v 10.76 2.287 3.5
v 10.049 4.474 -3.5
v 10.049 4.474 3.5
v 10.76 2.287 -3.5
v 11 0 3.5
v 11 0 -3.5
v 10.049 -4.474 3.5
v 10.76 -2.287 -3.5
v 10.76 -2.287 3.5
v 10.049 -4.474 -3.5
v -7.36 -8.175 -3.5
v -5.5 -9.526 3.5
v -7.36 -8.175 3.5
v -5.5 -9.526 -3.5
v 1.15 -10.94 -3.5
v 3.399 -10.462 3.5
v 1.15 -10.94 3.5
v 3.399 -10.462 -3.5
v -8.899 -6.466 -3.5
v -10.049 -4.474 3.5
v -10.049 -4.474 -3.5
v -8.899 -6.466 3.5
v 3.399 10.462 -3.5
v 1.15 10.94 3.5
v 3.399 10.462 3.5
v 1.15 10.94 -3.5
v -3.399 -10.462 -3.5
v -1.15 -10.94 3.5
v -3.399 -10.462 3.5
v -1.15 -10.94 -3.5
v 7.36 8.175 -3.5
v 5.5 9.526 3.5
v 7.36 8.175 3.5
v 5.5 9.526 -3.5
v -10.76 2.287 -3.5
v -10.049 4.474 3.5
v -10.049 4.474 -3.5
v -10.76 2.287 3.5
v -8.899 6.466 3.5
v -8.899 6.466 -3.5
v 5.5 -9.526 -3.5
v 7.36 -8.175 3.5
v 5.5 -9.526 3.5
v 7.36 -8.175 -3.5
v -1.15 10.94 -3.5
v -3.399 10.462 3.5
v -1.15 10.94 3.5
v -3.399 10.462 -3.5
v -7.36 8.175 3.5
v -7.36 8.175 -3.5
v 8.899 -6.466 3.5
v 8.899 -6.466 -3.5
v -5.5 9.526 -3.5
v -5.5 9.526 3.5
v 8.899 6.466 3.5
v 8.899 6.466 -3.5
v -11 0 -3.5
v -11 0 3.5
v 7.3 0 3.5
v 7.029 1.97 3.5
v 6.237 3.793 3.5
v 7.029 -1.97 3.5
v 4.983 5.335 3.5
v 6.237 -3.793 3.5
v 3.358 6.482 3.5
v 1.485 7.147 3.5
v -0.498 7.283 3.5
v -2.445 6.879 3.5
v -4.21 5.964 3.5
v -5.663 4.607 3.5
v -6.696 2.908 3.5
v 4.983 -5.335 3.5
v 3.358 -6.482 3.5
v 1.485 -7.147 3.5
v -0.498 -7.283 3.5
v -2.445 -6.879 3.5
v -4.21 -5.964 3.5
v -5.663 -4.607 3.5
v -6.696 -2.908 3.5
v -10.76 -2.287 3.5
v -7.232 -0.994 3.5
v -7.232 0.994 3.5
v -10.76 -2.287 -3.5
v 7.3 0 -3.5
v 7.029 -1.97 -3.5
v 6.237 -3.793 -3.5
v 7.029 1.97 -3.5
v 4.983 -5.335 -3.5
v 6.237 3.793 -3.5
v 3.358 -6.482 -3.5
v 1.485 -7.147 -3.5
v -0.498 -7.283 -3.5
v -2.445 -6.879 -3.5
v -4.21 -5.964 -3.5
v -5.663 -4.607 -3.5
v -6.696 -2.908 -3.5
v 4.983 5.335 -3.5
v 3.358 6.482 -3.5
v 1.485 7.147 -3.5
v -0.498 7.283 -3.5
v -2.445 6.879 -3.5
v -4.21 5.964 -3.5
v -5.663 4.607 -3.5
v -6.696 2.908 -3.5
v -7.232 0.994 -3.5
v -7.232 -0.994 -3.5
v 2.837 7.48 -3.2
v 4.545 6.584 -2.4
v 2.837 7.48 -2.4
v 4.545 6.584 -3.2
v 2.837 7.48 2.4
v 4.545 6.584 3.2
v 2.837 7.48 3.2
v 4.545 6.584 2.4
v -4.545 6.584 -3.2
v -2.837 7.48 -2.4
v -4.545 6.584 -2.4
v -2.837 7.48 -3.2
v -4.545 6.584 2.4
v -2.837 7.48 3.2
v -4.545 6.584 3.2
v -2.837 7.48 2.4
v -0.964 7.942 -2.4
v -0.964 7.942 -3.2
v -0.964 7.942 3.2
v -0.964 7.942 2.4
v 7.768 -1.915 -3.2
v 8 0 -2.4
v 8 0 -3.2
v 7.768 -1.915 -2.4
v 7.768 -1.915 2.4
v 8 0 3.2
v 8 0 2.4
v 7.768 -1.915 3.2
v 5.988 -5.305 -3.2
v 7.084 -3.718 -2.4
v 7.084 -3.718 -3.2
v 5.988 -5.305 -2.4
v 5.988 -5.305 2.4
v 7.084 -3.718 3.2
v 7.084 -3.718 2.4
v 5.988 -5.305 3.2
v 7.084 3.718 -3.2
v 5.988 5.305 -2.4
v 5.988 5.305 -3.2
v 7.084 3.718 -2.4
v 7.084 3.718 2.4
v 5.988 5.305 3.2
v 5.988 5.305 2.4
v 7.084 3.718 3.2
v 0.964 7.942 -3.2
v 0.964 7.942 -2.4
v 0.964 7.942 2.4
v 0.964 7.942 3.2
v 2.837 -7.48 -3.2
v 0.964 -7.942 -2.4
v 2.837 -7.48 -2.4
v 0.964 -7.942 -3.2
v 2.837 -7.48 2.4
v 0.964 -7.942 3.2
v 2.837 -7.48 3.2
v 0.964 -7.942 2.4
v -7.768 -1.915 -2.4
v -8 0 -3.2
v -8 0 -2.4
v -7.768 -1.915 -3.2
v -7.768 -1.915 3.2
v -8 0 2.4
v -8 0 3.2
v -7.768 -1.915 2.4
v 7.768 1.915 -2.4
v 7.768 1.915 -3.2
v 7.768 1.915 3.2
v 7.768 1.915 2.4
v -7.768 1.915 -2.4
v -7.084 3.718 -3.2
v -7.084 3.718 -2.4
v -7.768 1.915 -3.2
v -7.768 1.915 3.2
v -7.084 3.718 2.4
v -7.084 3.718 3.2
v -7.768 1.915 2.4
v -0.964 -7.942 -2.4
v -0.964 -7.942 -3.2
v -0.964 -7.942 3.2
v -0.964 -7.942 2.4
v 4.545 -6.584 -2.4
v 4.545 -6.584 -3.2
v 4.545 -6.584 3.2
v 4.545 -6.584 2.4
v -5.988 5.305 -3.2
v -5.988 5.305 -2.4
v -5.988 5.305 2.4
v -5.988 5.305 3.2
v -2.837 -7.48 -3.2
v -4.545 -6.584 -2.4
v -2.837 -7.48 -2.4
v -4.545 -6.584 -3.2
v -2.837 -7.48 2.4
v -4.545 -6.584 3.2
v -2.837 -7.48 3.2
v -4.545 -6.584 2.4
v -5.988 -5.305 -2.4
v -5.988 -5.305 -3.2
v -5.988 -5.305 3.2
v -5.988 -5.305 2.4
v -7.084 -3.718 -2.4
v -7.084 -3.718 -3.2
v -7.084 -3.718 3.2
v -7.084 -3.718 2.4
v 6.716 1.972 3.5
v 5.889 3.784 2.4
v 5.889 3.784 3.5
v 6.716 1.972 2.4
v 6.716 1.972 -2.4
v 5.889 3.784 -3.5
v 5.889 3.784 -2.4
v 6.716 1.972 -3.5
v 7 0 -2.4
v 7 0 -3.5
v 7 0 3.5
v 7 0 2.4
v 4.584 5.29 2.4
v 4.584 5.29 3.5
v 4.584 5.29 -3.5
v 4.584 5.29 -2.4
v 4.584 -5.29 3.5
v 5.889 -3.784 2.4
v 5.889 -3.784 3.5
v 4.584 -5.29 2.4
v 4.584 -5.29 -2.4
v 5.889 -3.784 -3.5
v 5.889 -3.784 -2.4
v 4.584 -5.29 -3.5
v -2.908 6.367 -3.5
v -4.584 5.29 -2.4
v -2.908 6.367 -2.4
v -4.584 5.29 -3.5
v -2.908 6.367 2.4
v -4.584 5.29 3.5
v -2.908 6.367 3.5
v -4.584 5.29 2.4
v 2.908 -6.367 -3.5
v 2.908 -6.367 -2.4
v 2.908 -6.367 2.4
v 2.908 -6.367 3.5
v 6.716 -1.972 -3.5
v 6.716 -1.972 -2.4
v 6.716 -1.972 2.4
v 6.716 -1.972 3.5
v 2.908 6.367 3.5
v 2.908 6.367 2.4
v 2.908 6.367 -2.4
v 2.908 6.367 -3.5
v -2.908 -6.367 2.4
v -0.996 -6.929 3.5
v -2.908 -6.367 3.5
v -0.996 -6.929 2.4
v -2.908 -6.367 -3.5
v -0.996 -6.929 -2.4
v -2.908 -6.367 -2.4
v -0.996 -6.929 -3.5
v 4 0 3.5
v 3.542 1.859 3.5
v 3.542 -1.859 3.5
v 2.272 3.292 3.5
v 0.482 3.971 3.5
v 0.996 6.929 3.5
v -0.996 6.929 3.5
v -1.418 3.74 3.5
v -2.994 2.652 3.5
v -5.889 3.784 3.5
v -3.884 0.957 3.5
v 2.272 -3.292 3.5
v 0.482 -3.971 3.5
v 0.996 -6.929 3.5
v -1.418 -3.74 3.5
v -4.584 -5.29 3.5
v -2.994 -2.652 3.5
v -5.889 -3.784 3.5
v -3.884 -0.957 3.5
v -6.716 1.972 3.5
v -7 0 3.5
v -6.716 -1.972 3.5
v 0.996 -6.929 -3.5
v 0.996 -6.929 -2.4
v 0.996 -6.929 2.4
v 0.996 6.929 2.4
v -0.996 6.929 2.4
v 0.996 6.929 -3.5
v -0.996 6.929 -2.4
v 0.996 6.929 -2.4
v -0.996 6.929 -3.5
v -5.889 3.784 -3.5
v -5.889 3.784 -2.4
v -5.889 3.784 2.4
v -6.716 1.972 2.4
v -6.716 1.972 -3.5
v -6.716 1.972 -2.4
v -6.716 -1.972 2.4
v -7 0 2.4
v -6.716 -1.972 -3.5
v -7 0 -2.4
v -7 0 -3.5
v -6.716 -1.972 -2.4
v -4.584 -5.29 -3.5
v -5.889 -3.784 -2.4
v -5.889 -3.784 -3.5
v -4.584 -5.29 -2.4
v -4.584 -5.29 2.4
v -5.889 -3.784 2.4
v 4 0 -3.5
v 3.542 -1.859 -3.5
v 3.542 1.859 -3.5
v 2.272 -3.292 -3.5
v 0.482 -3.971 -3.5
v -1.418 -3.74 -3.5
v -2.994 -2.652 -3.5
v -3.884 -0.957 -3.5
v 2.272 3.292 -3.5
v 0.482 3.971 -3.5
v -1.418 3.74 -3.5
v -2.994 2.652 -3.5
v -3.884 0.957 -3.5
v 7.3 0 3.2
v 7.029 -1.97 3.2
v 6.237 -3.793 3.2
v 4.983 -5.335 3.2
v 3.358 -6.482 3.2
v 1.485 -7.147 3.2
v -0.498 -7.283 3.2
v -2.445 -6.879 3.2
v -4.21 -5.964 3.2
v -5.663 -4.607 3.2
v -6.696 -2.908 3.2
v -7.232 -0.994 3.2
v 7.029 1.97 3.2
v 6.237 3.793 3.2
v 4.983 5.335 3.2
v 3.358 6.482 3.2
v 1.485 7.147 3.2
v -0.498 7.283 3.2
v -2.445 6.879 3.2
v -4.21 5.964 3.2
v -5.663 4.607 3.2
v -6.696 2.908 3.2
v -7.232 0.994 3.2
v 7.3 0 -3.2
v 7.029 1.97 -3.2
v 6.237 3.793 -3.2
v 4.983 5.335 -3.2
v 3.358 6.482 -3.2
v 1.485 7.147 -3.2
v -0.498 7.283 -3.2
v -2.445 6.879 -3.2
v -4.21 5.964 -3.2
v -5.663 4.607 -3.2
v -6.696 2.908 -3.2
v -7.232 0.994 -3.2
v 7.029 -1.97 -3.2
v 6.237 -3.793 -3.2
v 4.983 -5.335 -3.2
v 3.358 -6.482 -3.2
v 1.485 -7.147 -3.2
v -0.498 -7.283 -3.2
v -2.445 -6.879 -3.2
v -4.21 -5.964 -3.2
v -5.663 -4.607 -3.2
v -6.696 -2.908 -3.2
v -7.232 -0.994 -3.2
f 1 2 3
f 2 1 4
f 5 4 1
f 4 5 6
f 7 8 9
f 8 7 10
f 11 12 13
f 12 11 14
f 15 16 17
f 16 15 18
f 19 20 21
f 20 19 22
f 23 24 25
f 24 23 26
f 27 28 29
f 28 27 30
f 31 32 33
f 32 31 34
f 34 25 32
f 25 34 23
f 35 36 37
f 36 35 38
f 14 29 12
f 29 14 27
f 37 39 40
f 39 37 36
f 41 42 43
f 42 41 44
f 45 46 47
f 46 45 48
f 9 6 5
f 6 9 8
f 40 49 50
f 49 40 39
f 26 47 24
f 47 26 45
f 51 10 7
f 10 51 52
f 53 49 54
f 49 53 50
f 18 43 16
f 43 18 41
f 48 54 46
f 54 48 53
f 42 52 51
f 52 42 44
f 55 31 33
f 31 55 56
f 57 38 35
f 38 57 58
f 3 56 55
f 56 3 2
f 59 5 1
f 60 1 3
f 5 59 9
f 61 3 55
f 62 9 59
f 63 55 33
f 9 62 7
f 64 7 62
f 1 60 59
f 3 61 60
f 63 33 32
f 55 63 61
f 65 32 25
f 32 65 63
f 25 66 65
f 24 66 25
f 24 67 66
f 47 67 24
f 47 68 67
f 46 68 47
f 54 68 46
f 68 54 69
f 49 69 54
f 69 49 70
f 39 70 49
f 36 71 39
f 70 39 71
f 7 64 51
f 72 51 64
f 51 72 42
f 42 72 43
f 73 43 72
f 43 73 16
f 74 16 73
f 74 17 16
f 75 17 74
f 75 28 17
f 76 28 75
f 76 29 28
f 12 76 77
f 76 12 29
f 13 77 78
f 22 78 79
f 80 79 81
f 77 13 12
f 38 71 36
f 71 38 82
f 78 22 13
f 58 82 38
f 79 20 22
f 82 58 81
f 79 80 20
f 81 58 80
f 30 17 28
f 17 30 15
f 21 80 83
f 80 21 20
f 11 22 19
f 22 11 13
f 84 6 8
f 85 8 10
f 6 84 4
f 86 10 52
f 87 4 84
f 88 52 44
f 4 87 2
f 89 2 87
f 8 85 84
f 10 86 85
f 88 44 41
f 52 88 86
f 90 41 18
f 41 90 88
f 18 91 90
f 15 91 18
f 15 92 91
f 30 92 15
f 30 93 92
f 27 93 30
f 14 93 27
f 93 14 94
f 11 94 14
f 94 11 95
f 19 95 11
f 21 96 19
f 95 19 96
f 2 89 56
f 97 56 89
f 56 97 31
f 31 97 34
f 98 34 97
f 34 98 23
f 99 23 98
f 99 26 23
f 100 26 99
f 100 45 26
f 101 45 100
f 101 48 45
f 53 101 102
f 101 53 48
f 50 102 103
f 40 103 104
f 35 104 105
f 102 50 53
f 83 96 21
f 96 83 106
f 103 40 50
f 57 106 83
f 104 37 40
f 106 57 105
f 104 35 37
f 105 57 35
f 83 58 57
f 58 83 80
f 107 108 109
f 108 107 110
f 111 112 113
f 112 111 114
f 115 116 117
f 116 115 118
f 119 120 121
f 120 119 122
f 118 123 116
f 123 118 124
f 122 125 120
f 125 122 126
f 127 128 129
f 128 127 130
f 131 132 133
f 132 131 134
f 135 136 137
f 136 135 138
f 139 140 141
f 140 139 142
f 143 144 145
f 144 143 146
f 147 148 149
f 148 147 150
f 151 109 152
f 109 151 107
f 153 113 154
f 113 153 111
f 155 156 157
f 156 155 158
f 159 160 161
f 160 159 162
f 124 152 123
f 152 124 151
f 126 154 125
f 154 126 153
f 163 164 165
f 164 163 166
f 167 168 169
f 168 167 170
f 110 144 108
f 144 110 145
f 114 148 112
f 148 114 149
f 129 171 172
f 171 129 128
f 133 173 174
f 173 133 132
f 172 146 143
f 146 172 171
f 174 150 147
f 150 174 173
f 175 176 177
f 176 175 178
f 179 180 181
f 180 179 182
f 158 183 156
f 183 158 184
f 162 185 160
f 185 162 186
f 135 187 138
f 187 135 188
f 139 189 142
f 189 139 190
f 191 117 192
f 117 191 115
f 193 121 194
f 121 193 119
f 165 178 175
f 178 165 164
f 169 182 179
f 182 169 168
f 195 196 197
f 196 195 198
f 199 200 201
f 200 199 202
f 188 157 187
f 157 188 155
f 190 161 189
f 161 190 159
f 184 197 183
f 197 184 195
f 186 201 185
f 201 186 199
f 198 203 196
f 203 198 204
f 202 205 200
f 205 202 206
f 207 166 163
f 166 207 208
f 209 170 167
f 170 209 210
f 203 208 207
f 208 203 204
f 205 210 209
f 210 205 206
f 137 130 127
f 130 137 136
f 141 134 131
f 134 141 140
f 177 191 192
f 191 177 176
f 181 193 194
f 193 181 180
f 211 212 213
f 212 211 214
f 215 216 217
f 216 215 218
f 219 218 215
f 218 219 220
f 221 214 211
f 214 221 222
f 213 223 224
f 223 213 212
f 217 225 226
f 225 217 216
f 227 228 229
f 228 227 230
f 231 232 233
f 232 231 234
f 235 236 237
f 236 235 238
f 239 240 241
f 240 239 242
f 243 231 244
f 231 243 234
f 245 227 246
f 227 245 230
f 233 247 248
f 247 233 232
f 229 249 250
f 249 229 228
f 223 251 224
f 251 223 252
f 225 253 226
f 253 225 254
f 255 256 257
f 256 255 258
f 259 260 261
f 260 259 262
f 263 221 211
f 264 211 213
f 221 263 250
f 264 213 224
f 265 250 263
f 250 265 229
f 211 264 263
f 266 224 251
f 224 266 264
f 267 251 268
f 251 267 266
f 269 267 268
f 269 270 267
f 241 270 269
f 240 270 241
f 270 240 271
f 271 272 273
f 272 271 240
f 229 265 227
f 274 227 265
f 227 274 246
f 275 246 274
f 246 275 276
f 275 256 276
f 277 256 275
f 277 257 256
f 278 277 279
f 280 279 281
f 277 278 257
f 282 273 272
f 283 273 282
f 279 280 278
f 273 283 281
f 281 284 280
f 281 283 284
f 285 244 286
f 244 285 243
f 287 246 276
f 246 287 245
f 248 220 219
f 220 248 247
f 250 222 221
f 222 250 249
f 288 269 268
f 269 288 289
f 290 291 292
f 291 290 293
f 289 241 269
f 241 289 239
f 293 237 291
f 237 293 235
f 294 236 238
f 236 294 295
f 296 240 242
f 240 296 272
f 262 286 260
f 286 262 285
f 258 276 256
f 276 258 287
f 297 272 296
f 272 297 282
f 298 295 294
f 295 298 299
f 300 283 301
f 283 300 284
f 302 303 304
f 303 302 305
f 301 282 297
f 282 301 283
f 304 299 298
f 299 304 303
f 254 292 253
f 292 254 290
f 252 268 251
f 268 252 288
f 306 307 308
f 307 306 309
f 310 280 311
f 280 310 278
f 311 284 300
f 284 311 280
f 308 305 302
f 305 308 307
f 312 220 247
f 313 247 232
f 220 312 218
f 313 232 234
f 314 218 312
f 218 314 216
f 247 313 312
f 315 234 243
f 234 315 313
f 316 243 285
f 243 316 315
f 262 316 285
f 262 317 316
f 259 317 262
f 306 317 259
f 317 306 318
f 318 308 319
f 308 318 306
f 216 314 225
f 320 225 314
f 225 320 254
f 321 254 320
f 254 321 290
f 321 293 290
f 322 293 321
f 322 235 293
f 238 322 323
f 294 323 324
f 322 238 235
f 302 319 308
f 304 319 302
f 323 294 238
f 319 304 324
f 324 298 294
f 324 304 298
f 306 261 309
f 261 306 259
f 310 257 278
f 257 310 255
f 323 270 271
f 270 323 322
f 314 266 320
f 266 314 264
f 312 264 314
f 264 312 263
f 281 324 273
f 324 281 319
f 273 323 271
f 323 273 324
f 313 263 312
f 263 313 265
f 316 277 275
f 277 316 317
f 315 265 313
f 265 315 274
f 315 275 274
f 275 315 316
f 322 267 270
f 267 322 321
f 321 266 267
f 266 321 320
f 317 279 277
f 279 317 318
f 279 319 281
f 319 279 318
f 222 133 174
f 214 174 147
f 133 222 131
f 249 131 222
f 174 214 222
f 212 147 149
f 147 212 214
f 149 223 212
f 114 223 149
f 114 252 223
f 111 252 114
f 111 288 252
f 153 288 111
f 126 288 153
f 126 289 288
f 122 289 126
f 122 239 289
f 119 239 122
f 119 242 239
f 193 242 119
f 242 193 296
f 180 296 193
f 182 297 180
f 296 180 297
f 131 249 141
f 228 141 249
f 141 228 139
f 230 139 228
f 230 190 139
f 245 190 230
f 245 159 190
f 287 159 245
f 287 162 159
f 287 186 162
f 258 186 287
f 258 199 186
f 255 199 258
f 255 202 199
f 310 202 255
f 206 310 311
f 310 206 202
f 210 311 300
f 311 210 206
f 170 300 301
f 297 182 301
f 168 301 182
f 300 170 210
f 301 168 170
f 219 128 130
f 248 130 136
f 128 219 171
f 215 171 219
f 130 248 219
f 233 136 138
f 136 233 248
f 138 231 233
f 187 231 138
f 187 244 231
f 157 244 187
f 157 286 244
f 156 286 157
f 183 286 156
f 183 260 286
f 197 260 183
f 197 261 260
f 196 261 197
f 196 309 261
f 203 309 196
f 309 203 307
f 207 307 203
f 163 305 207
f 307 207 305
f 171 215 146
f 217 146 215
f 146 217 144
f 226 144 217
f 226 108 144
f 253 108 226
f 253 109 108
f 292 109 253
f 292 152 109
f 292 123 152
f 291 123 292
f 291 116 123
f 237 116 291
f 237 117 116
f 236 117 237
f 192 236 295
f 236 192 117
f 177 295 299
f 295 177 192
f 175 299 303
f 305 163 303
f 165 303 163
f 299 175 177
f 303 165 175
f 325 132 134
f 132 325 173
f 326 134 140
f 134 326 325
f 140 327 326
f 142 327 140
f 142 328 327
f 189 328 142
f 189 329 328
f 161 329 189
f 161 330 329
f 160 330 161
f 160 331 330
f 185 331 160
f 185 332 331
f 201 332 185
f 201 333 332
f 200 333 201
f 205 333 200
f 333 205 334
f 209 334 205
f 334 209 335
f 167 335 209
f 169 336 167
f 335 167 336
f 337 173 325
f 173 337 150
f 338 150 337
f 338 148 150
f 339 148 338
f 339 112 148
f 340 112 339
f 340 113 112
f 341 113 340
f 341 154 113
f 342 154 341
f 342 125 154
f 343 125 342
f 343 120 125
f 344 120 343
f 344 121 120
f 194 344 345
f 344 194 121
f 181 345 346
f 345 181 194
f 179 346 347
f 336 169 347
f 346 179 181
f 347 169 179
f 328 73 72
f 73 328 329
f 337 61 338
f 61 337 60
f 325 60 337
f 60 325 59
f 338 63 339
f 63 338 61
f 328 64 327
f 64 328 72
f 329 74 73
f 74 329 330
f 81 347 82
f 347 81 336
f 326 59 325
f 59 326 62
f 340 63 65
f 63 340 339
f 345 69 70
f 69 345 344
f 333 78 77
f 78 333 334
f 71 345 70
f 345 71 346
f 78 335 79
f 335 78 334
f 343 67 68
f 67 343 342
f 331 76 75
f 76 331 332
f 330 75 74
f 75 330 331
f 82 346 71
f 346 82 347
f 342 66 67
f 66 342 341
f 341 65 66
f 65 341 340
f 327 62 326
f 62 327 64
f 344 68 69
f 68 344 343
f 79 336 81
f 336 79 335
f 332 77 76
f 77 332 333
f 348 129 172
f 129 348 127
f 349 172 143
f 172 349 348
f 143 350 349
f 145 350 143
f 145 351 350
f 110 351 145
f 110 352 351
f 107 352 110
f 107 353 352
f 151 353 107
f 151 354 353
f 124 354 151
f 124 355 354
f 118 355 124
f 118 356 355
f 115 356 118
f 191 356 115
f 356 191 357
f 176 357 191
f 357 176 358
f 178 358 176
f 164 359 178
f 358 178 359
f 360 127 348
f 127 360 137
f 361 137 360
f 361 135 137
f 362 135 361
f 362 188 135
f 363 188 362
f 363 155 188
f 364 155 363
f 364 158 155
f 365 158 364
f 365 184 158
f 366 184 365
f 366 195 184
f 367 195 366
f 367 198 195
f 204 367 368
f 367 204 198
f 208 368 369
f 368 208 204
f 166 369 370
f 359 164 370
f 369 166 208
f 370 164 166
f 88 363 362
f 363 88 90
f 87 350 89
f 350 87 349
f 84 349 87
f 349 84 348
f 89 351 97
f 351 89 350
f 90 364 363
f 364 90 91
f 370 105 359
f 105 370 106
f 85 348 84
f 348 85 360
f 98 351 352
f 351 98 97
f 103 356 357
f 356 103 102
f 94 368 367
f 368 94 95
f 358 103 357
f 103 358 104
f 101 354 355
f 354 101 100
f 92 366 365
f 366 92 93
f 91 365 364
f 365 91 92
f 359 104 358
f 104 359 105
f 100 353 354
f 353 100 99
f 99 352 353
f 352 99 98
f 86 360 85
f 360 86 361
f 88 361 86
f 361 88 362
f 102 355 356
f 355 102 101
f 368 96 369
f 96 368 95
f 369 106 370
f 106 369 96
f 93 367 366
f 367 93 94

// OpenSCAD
// Parameters
bore_d = 8.0; //[4.0:16.0:0.1]
outer_d = 22.0; //[11.0:44.0:0.1]
width = 7.0; //[3.5:14.0:0.1]
inner_ring_radial_thk = 3.0; //[1.5:6.0:0.1]
outer_ring_radial_thk = 3.0; //[1.5:6.0:0.1]
ball_d = 3.5; //[1.5:7.0:0.1]
ball_count = 7; //[5:12:1]
ball_clearance = 0.2; //[0.0:0.6:0.05]
groove_depth = 0.6; //[0.2:1.2:0.05]
groove_radius = 1.9; //[1.0:3.5:0.05]
cage_thk = 0.8; //[0.4:1.6:0.05]
cage_clearance = 0.2; //[0.0:0.6:0.05]
shield_thk = 0.3; //[0.15:0.8:0.05]
shield_radial_gap = 0.3; //[0.1:1.0:0.05]
overlap = 0.8; //[0.5:2.0:0.1]

// Base Shapes
module outer_ring_outer_cyl() {
  cylinder(r=outer_d/2, h=width, center=true);
}

module outer_ring_inner_bore_cyl() {
  cylinder(r=outer_d/2 - outer_ring_radial_thk, h=width + 2*overlap, center=true);
}

module inner_ring_outer_cyl() {
  cylinder(r=bore_d/2 + inner_ring_radial_thk, h=width, center=true);
}

module inner_ring_bore_cyl() {
  cylinder(r=bore_d/2, h=width + 2*overlap, center=true);
}

module outer_race_groove_torus() {
  rotate_extrude() translate([((outer_d/2 - outer_ring_radial_thk) - (bore_d/2 + inner_ring_radial_thk))/2 + (bore_d/2 + inner_ring_radial_thk), 0, 0])
    circle(r=groove_radius);
}

module inner_race_groove_torus() {
  rotate_extrude() translate([((outer_d/2 - outer_ring_radial_thk) - (bore_d/2 + inner_ring_radial_thk))/2 + (bore_d/2 + inner_ring_radial_thk), 0, 0])
    circle(r=groove_radius);
}

module ball(position_angle) {
  translate([((outer_d/2 - outer_ring_radial_thk) + (bore_d/2 + inner_ring_radial_thk))/2 * cos(position_angle),
             ((outer_d/2 - outer_ring_radial_thk) + (bore_d/2 + inner_ring_radial_thk))/2 * sin(position_angle), 0])
    sphere(r=ball_d/2);
}

module cage_outer_cyl() {
  cylinder(r=((outer_d/2 - outer_ring_radial_thk) + (bore_d/2 + inner_ring_radial_thk))/2 + (ball_d/2 + cage_clearance) + cage_thk,
           h=width - 2*(shield_thk + overlap), center=true);
}

module cage_inner_cyl() {
  cylinder(r=((outer_d/2 - outer_ring_radial_thk) + (bore_d/2 + inner_ring_radial_thk))/2 - (ball_d/2 + cage_clearance) - cage_thk,
           h=width - 2*(shield_thk + overlap) + 2*overlap, center=true);
}

module shield_top_disk() {
  translate([0, 0, width/2 - shield_thk/2])
    cylinder(r=outer_d/2 - overlap, h=shield_thk, center=true);
}

module shield_top_hole() {
  translate([0, 0, width/2 - shield_thk/2])
    cylinder(r=bore_d/2 + inner_ring_radial_thk + shield_radial_gap, h=shield_thk + 2*overlap, center=true);
}

module shield_bottom_disk() {
  translate([0, 0, -width/2 + shield_thk/2])
    cylinder(r=outer_d/2 - overlap, h=shield_thk, center=true);
}

module shield_bottom_hole() {
  translate([0, 0, -width/2 + shield_thk/2])
    cylinder(r=bore_d/2 + inner_ring_radial_thk + shield_radial_gap, h=shield_thk + 2*overlap, center=true);
}

// Operations
module outer_ring_raw() {
  difference() {
    outer_ring_outer_cyl();
    outer_ring_inner_bore_cyl();
  }
}

module inner_ring_raw() {
  difference() {
    inner_ring_outer_cyl();
    inner_ring_bore_cyl();
  }
}

module outer_race_groove_scaled() {
  scale([1, 1, groove_depth/groove_radius])
    outer_race_groove_torus();
}

module inner_race_groove_scaled() {
  scale([1, 1, groove_depth/groove_radius])
    inner_race_groove_torus();
}

module outer_ring() {
  difference() {
    outer_ring_raw();
    outer_race_groove_scaled();
  }
}

module inner_ring() {
  difference() {
    inner_ring_raw();
    inner_race_groove_scaled();
  }
}

module raceway_grooves() {
  union() {
    outer_race_groove_scaled();
    inner_race_groove_scaled();
  }
}

module ball_set() {
  union() {
    for (i = [0:ball_count-1]) {
      ball(360/ball_count*i);
    }
  }
}

module cage_ring() {
  difference() {
    cage_outer_cyl();
    cage_inner_cyl();
  }
}

module cage() {
  union() {
    cage_ring();
    ball_set();
  }
}

module shield_top() {
  difference() {
    shield_top_disk();
    shield_top_hole();
  }
}

module shield_bottom() {
  difference() {
    shield_bottom_disk();
    shield_bottom_hole();
  }
}

module shields_or_seals() {
  union() {
    shield_top();
    shield_bottom();
  }
}

module bearing_core() {
  union() {
    outer_ring();
    inner_ring();
    cage();
    shields_or_seals();
  }
}

// Final Output
bearing_core();
